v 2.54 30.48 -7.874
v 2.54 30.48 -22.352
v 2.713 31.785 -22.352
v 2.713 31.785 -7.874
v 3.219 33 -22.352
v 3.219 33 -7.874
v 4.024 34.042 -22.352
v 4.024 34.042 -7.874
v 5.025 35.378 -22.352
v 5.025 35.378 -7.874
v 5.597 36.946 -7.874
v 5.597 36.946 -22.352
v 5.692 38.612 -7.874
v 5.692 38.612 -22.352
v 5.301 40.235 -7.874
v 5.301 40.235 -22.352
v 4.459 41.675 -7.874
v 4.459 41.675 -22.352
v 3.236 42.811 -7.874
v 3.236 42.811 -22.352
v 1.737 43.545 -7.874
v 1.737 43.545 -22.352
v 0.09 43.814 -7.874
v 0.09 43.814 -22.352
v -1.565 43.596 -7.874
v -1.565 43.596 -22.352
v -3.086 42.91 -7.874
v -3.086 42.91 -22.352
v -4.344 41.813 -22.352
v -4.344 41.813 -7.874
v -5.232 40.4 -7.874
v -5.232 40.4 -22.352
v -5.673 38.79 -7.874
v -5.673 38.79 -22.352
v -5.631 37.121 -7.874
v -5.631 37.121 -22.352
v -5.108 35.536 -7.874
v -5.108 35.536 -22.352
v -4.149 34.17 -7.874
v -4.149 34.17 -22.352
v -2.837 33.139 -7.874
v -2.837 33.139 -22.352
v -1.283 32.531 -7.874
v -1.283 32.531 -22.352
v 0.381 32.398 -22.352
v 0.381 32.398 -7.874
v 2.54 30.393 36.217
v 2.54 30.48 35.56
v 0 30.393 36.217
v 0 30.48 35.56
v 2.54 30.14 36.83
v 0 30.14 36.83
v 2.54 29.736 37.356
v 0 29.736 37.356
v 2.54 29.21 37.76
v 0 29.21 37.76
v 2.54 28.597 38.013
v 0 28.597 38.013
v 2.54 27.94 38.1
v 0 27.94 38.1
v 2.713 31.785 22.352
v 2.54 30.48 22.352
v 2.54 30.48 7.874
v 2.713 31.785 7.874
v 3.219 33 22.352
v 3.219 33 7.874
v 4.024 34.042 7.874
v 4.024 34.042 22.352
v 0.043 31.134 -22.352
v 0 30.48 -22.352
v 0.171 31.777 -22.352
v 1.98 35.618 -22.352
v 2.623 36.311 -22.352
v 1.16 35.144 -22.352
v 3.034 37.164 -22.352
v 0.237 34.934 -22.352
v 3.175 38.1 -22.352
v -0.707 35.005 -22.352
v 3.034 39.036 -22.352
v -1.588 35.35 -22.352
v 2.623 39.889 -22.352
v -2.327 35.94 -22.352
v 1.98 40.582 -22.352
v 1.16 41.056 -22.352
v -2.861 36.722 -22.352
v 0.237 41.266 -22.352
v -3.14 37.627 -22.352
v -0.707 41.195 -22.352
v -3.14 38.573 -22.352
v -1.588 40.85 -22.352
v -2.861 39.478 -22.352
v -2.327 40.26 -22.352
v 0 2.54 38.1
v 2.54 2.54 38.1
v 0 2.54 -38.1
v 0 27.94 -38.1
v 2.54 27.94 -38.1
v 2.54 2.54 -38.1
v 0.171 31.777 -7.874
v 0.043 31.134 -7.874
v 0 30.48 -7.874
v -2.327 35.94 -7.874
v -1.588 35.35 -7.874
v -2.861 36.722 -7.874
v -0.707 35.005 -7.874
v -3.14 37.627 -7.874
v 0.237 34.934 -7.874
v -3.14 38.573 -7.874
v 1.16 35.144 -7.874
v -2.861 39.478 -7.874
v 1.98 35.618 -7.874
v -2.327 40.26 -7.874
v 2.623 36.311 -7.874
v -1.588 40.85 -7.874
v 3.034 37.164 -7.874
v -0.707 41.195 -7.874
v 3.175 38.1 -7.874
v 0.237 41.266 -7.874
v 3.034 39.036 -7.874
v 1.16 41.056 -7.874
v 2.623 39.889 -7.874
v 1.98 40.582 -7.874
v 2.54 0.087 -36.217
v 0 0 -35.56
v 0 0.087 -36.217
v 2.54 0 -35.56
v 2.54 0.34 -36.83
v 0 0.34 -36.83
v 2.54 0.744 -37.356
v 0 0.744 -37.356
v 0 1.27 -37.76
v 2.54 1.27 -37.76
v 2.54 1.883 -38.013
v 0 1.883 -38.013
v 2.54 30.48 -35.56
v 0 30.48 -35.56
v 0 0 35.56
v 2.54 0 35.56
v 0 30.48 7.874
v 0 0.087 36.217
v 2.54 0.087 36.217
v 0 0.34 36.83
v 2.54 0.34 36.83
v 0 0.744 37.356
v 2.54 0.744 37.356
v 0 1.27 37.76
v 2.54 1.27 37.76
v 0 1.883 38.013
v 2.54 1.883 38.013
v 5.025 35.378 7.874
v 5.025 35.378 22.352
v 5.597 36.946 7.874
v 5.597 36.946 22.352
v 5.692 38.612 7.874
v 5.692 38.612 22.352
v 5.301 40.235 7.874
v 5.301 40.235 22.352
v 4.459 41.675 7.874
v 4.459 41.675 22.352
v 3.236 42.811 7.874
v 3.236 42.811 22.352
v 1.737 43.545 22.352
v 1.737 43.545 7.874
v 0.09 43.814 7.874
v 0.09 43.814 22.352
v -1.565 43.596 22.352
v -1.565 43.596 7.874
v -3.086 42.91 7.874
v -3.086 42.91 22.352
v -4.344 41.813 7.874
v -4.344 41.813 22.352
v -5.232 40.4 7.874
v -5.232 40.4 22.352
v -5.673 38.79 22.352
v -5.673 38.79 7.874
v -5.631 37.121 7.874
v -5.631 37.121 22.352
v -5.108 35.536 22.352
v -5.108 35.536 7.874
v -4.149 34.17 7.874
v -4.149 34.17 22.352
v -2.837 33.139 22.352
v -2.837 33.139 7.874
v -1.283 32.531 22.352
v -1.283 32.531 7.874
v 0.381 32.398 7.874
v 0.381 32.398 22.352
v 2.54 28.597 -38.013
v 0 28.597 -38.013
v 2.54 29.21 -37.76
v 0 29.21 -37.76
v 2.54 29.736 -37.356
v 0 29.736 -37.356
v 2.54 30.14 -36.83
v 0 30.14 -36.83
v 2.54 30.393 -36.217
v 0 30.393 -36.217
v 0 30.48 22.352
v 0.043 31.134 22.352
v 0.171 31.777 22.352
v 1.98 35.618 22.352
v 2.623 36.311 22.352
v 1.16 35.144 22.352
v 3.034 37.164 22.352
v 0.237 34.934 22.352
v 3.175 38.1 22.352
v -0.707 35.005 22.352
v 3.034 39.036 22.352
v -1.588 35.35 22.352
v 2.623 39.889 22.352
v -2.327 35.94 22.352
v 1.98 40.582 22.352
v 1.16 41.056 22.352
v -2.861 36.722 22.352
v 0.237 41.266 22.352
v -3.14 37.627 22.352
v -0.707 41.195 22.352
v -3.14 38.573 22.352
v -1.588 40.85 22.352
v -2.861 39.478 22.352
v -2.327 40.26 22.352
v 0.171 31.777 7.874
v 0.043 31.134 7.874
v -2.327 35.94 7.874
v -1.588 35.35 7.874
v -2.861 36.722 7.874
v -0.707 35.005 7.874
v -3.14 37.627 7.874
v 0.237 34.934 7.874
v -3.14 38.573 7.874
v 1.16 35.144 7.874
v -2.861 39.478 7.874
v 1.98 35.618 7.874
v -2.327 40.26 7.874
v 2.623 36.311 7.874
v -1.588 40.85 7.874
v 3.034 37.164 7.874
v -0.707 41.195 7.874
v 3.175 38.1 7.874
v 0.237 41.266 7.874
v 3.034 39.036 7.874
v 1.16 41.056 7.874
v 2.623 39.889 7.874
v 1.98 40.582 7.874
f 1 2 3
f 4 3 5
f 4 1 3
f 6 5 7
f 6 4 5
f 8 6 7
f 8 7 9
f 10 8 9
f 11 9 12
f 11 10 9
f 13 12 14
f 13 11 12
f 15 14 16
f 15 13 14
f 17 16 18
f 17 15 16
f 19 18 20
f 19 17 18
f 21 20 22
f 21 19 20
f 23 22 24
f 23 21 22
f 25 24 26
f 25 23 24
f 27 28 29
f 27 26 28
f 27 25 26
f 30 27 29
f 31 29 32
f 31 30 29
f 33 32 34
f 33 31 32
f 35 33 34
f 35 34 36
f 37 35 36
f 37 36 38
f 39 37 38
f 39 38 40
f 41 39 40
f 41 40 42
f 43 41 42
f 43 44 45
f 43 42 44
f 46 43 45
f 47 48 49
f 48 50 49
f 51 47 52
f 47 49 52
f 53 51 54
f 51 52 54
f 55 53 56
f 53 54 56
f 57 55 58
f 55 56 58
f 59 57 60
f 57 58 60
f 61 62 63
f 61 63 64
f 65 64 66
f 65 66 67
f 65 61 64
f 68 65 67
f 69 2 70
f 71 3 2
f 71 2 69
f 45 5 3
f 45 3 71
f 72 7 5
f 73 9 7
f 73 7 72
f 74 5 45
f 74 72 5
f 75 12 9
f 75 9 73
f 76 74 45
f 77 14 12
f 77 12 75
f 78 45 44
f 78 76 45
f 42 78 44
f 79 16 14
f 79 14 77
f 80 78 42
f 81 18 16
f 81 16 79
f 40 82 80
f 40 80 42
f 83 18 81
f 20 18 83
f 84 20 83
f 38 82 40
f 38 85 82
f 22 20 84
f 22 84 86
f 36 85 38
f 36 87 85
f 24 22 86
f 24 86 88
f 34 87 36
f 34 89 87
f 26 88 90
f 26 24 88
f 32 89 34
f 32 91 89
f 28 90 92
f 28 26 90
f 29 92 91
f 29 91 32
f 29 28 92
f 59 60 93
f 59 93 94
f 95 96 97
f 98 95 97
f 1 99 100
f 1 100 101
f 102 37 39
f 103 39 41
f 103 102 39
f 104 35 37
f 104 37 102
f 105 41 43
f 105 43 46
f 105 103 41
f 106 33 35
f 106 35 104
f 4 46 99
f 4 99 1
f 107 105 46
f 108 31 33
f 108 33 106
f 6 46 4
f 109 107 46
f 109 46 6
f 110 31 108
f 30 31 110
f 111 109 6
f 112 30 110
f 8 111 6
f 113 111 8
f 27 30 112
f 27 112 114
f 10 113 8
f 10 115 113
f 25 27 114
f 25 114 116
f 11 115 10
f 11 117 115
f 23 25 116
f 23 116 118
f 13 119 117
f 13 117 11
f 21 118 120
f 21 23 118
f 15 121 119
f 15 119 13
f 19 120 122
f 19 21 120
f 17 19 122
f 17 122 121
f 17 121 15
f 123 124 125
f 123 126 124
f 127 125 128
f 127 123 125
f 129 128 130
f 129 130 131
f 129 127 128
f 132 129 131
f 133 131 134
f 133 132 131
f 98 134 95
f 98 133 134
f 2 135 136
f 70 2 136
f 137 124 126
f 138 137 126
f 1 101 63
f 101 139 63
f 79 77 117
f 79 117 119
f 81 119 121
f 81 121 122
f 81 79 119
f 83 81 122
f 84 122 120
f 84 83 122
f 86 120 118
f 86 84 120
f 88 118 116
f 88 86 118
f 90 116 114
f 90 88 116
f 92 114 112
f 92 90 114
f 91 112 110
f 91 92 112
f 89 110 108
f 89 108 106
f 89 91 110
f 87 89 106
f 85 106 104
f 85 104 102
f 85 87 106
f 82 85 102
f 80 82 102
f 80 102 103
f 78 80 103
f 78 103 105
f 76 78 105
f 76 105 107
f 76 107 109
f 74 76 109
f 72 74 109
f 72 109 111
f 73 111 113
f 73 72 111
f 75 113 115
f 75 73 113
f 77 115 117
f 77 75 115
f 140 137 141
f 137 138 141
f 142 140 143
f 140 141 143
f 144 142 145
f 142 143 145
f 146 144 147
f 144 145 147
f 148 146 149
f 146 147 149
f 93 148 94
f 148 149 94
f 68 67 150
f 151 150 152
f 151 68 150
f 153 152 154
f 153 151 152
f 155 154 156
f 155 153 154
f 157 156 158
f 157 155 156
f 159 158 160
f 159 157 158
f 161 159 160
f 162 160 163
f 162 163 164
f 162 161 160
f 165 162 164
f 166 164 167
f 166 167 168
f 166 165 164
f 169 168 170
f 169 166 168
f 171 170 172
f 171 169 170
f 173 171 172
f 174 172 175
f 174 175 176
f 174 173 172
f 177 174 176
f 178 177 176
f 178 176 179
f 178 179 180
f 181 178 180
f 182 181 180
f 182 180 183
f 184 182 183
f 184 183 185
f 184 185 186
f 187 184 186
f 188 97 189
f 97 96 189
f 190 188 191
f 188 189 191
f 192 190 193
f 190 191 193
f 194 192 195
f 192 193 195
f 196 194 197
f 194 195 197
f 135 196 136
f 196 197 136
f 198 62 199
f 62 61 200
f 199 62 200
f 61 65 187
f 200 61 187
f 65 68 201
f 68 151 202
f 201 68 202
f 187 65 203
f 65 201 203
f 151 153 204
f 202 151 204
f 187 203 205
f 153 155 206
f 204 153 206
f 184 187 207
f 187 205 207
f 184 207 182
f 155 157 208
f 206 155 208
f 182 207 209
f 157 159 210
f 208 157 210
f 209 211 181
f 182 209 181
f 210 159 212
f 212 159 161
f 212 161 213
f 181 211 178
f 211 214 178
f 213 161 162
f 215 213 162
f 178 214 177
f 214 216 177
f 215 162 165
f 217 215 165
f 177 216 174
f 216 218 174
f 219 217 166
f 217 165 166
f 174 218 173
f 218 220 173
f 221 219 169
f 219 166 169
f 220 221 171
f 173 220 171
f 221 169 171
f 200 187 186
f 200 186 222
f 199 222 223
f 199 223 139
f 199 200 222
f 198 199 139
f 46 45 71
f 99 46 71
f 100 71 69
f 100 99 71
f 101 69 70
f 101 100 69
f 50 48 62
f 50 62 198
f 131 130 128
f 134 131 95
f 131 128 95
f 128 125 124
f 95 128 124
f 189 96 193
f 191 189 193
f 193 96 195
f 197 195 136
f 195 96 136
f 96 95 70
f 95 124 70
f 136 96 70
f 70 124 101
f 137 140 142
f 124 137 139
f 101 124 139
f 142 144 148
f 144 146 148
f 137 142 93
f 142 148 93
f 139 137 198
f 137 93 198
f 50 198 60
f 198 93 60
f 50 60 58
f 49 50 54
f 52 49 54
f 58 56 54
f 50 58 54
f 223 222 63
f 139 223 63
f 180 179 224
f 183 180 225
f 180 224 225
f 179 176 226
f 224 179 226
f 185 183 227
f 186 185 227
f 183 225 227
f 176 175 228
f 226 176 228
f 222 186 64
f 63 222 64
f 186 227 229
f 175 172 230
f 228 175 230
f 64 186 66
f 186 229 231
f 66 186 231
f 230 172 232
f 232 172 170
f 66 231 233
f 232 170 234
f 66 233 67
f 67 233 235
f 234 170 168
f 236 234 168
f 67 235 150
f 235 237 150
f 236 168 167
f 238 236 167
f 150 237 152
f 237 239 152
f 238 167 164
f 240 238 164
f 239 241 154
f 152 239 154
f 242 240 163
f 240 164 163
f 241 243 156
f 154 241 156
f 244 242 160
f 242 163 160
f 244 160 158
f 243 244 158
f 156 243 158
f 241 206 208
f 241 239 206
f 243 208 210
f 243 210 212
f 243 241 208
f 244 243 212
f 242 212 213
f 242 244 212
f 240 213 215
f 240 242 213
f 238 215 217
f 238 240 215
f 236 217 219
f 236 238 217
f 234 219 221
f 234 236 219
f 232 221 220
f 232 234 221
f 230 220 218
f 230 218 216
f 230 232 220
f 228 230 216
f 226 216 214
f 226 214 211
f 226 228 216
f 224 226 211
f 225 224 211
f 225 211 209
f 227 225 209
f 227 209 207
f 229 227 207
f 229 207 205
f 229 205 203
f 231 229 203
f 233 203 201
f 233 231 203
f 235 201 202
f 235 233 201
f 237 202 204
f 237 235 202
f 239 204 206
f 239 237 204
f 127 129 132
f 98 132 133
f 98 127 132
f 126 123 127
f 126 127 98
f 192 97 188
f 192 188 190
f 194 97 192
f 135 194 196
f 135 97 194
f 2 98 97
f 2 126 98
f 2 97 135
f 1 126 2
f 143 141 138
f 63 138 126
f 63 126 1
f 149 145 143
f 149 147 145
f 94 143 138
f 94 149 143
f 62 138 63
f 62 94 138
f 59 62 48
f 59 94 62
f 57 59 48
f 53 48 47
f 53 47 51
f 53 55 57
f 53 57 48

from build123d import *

# Parameters (mm, degrees)
SKETCH1_R           = 3.175
BOSS_EXTRUDE1_DEPTH = 38.1
SKETCH1_3_R         = 3.175
CUT_EXTRUDE1_DEPTH  = 7.874
SKETCH2_R           = 3.175
CUT_EXTRUDE2_DEPTH  = 15.748
FILLET1_R           = 2.54


with BuildPart() as part:
    # Sketch1 → Boss-Extrude1 (new, symmetric)
    with BuildSketch(Plane.XY):
        with BuildLine():
            Line((0, 0), (2.54, 0))
            Line((2.54, 0), (2.54, 30.48))
            ThreePointArc((2.54, 30.48), (2.925884615, 32.409423077), (4.024171598, 34.042011834))
            ThreePointArc((4.024171598, 34.042011834), (-2.351034724, 43.309017251), (0.381023909, 32.39771574))
            ThreePointArc((0.381023909, 32.39771574), (0.096177955, 31.457600747), (0, 30.48))
            Line((0, 30.48), (0, 0))
        make_face()
        with Locations((0, 38.1)):
            Circle(SKETCH1_R, mode=Mode.SUBTRACT)
    extrude(amount=BOSS_EXTRUDE1_DEPTH, both=True)

    # Sketch1<3> → Cut-Extrude1 (cut, symmetric)
    with BuildSketch(Plane.XY):
        with BuildLine():
            Line((0, 30.48), (2.54, 30.48))
            ThreePointArc((2.54, 30.48), (2.925884615, 32.409423077), (4.024171598, 34.042011834))
            ThreePointArc((4.024171598, 34.042011834), (-2.351034724, 43.309017251), (0.381023909, 32.39771574))
            ThreePointArc((0.381023909, 32.39771574), (0.096177955, 31.457600747), (0, 30.48))
        make_face()
        with Locations((0, 38.1)):
            Circle(SKETCH1_3_R, mode=Mode.SUBTRACT)
    extrude(amount=CUT_EXTRUDE1_DEPTH, both=True, mode=Mode.SUBTRACT)

    # Sketch2 → Cut-Extrude2 (cut)
    with BuildSketch(Plane.XY.offset(38.1)):
        with BuildLine():
            Line((2.54, 30.48), (0, 30.48))
            ThreePointArc((0, 30.48), (0.096177955, 31.457600747), (0.381023909, 32.39771574))
            ThreePointArc((0.381023909, 32.39771574), (-2.351034724, 43.309017251), (4.024171598, 34.042011834))
            ThreePointArc((4.024171598, 34.042011834), (2.925884615, 32.409423077), (2.54, 30.48))
        make_face()
        with Locations((0, 38.1)):
            Circle(SKETCH2_R, mode=Mode.SUBTRACT)
    cut_extrude2 = extrude(amount=-CUT_EXTRUDE2_DEPTH, mode=Mode.SUBTRACT)

    # Mirror1: Cut-Extrude2 across plane
    add(cut_extrude2.mirror(Plane.XY), mode=Mode.SUBTRACT)

    # Fillet1
    fillet1_edges = [part.edges().sort_by_distance(p)[0] for p in [
        (1.27, 0, 38.1),
        (1.27, 30.48, 38.1),
        (1.27, 0, -38.1),
        (1.27, 30.48, -38.1),
    ]]
    fillet(fillet1_edges, radius=FILLET1_R)


solid = part.part
